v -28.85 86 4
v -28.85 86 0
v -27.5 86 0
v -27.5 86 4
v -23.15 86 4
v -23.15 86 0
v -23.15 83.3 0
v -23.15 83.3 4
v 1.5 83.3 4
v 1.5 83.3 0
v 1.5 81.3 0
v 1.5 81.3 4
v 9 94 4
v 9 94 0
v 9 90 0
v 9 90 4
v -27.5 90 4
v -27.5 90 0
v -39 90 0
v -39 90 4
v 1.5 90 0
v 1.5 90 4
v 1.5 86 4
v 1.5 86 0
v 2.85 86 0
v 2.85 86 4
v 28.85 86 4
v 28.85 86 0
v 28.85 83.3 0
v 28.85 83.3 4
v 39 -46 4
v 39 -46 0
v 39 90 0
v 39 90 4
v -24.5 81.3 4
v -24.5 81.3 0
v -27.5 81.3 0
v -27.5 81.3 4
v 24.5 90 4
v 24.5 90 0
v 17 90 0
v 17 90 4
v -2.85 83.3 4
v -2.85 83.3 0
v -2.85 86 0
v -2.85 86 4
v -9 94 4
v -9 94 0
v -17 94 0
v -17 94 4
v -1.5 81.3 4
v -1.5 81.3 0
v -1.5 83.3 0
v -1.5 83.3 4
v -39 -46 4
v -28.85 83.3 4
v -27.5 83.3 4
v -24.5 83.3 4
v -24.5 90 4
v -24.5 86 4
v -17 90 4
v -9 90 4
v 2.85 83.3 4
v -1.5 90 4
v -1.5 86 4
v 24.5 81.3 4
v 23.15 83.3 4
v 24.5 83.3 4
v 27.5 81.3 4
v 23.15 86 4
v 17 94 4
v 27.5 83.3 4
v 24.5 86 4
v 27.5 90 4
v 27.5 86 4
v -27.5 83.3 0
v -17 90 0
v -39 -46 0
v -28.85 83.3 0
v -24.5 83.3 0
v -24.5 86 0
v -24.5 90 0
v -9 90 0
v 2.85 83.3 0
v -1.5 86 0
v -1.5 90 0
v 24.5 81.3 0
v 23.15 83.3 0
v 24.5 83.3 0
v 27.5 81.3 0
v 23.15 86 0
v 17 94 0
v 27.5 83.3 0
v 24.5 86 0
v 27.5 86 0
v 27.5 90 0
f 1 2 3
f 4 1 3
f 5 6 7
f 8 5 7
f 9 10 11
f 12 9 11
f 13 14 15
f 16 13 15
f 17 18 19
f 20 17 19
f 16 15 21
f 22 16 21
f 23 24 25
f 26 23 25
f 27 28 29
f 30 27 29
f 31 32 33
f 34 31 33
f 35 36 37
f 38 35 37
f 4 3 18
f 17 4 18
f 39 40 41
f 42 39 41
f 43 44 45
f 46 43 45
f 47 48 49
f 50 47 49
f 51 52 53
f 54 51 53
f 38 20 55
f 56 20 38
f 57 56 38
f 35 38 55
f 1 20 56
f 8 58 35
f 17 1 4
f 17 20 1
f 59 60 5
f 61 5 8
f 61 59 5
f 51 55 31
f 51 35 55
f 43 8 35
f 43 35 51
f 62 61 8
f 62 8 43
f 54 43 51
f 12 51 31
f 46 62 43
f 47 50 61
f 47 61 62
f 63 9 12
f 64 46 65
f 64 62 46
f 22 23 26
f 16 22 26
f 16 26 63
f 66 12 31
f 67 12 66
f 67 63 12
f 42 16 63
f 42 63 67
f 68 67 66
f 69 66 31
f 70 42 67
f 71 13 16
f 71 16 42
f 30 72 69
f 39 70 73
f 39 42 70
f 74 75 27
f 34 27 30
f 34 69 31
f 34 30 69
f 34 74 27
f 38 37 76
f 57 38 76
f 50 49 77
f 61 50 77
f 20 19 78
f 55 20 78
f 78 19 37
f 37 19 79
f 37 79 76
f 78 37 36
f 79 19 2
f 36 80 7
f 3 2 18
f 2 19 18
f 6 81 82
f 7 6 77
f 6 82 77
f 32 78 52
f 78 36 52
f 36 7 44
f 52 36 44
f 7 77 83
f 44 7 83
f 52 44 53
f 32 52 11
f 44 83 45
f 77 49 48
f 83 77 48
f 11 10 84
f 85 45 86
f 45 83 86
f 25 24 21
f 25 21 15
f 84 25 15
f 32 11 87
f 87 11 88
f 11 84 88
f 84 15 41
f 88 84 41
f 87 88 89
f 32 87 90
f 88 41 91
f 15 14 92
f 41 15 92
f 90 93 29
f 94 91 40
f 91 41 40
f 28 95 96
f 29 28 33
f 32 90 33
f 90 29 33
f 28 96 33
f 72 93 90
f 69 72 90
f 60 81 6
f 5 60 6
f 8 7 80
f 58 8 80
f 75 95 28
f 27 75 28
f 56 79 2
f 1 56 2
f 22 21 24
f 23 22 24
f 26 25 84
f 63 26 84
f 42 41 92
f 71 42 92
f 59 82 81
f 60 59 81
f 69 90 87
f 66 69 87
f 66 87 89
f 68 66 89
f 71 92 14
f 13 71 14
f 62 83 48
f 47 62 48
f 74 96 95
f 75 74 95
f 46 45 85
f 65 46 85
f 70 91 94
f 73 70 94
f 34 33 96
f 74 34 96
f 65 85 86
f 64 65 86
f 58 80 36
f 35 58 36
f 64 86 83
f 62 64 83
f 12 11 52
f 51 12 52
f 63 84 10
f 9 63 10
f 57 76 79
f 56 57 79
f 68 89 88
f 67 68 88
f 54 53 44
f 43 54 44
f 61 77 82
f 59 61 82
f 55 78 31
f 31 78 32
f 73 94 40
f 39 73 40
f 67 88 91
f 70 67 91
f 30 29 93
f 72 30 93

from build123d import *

# Parameters (mm, degrees)
EXTRUDE_1_DEPTH = 4


with BuildPart() as part:
    # 草图1 → 凸台-拉伸1 (new body)
    with BuildSketch(Plane.XY):
        Polygon((-39, 90), (-39, -46), (39, -46), (39, 90), (27.5, 90), (27.5, 86), (28.85, 86), (28.85, 83.3), (27.5, 83.3), (27.5, 81.3), (24.5, 81.3), (24.5, 83.3), (23.15, 83.3), (23.15, 86), (24.5, 86), (24.5, 90), (17, 90), (17, 94), (9, 94), (9, 90), (1.5, 90), (1.5, 86), (2.85, 86), (2.85, 83.3), (1.5, 83.3), (1.5, 81.3), (-1.5, 81.3), (-1.5, 83.3), (-2.85, 83.3), (-2.85, 86), (-1.5, 86), (-1.5, 90), (-9, 90), (-9, 94), (-17, 94), (-17, 90), (-24.5, 90), (-24.5, 86), (-23.15, 86), (-23.15, 83.3), (-24.5, 83.3), (-24.5, 81.3), (-27.5, 81.3), (-27.5, 83.3), (-28.85, 83.3), (-28.85, 86), (-27.5, 86), (-27.5, 90), align=None)
    extrude(amount=EXTRUDE_1_DEPTH)


solid = part.part
